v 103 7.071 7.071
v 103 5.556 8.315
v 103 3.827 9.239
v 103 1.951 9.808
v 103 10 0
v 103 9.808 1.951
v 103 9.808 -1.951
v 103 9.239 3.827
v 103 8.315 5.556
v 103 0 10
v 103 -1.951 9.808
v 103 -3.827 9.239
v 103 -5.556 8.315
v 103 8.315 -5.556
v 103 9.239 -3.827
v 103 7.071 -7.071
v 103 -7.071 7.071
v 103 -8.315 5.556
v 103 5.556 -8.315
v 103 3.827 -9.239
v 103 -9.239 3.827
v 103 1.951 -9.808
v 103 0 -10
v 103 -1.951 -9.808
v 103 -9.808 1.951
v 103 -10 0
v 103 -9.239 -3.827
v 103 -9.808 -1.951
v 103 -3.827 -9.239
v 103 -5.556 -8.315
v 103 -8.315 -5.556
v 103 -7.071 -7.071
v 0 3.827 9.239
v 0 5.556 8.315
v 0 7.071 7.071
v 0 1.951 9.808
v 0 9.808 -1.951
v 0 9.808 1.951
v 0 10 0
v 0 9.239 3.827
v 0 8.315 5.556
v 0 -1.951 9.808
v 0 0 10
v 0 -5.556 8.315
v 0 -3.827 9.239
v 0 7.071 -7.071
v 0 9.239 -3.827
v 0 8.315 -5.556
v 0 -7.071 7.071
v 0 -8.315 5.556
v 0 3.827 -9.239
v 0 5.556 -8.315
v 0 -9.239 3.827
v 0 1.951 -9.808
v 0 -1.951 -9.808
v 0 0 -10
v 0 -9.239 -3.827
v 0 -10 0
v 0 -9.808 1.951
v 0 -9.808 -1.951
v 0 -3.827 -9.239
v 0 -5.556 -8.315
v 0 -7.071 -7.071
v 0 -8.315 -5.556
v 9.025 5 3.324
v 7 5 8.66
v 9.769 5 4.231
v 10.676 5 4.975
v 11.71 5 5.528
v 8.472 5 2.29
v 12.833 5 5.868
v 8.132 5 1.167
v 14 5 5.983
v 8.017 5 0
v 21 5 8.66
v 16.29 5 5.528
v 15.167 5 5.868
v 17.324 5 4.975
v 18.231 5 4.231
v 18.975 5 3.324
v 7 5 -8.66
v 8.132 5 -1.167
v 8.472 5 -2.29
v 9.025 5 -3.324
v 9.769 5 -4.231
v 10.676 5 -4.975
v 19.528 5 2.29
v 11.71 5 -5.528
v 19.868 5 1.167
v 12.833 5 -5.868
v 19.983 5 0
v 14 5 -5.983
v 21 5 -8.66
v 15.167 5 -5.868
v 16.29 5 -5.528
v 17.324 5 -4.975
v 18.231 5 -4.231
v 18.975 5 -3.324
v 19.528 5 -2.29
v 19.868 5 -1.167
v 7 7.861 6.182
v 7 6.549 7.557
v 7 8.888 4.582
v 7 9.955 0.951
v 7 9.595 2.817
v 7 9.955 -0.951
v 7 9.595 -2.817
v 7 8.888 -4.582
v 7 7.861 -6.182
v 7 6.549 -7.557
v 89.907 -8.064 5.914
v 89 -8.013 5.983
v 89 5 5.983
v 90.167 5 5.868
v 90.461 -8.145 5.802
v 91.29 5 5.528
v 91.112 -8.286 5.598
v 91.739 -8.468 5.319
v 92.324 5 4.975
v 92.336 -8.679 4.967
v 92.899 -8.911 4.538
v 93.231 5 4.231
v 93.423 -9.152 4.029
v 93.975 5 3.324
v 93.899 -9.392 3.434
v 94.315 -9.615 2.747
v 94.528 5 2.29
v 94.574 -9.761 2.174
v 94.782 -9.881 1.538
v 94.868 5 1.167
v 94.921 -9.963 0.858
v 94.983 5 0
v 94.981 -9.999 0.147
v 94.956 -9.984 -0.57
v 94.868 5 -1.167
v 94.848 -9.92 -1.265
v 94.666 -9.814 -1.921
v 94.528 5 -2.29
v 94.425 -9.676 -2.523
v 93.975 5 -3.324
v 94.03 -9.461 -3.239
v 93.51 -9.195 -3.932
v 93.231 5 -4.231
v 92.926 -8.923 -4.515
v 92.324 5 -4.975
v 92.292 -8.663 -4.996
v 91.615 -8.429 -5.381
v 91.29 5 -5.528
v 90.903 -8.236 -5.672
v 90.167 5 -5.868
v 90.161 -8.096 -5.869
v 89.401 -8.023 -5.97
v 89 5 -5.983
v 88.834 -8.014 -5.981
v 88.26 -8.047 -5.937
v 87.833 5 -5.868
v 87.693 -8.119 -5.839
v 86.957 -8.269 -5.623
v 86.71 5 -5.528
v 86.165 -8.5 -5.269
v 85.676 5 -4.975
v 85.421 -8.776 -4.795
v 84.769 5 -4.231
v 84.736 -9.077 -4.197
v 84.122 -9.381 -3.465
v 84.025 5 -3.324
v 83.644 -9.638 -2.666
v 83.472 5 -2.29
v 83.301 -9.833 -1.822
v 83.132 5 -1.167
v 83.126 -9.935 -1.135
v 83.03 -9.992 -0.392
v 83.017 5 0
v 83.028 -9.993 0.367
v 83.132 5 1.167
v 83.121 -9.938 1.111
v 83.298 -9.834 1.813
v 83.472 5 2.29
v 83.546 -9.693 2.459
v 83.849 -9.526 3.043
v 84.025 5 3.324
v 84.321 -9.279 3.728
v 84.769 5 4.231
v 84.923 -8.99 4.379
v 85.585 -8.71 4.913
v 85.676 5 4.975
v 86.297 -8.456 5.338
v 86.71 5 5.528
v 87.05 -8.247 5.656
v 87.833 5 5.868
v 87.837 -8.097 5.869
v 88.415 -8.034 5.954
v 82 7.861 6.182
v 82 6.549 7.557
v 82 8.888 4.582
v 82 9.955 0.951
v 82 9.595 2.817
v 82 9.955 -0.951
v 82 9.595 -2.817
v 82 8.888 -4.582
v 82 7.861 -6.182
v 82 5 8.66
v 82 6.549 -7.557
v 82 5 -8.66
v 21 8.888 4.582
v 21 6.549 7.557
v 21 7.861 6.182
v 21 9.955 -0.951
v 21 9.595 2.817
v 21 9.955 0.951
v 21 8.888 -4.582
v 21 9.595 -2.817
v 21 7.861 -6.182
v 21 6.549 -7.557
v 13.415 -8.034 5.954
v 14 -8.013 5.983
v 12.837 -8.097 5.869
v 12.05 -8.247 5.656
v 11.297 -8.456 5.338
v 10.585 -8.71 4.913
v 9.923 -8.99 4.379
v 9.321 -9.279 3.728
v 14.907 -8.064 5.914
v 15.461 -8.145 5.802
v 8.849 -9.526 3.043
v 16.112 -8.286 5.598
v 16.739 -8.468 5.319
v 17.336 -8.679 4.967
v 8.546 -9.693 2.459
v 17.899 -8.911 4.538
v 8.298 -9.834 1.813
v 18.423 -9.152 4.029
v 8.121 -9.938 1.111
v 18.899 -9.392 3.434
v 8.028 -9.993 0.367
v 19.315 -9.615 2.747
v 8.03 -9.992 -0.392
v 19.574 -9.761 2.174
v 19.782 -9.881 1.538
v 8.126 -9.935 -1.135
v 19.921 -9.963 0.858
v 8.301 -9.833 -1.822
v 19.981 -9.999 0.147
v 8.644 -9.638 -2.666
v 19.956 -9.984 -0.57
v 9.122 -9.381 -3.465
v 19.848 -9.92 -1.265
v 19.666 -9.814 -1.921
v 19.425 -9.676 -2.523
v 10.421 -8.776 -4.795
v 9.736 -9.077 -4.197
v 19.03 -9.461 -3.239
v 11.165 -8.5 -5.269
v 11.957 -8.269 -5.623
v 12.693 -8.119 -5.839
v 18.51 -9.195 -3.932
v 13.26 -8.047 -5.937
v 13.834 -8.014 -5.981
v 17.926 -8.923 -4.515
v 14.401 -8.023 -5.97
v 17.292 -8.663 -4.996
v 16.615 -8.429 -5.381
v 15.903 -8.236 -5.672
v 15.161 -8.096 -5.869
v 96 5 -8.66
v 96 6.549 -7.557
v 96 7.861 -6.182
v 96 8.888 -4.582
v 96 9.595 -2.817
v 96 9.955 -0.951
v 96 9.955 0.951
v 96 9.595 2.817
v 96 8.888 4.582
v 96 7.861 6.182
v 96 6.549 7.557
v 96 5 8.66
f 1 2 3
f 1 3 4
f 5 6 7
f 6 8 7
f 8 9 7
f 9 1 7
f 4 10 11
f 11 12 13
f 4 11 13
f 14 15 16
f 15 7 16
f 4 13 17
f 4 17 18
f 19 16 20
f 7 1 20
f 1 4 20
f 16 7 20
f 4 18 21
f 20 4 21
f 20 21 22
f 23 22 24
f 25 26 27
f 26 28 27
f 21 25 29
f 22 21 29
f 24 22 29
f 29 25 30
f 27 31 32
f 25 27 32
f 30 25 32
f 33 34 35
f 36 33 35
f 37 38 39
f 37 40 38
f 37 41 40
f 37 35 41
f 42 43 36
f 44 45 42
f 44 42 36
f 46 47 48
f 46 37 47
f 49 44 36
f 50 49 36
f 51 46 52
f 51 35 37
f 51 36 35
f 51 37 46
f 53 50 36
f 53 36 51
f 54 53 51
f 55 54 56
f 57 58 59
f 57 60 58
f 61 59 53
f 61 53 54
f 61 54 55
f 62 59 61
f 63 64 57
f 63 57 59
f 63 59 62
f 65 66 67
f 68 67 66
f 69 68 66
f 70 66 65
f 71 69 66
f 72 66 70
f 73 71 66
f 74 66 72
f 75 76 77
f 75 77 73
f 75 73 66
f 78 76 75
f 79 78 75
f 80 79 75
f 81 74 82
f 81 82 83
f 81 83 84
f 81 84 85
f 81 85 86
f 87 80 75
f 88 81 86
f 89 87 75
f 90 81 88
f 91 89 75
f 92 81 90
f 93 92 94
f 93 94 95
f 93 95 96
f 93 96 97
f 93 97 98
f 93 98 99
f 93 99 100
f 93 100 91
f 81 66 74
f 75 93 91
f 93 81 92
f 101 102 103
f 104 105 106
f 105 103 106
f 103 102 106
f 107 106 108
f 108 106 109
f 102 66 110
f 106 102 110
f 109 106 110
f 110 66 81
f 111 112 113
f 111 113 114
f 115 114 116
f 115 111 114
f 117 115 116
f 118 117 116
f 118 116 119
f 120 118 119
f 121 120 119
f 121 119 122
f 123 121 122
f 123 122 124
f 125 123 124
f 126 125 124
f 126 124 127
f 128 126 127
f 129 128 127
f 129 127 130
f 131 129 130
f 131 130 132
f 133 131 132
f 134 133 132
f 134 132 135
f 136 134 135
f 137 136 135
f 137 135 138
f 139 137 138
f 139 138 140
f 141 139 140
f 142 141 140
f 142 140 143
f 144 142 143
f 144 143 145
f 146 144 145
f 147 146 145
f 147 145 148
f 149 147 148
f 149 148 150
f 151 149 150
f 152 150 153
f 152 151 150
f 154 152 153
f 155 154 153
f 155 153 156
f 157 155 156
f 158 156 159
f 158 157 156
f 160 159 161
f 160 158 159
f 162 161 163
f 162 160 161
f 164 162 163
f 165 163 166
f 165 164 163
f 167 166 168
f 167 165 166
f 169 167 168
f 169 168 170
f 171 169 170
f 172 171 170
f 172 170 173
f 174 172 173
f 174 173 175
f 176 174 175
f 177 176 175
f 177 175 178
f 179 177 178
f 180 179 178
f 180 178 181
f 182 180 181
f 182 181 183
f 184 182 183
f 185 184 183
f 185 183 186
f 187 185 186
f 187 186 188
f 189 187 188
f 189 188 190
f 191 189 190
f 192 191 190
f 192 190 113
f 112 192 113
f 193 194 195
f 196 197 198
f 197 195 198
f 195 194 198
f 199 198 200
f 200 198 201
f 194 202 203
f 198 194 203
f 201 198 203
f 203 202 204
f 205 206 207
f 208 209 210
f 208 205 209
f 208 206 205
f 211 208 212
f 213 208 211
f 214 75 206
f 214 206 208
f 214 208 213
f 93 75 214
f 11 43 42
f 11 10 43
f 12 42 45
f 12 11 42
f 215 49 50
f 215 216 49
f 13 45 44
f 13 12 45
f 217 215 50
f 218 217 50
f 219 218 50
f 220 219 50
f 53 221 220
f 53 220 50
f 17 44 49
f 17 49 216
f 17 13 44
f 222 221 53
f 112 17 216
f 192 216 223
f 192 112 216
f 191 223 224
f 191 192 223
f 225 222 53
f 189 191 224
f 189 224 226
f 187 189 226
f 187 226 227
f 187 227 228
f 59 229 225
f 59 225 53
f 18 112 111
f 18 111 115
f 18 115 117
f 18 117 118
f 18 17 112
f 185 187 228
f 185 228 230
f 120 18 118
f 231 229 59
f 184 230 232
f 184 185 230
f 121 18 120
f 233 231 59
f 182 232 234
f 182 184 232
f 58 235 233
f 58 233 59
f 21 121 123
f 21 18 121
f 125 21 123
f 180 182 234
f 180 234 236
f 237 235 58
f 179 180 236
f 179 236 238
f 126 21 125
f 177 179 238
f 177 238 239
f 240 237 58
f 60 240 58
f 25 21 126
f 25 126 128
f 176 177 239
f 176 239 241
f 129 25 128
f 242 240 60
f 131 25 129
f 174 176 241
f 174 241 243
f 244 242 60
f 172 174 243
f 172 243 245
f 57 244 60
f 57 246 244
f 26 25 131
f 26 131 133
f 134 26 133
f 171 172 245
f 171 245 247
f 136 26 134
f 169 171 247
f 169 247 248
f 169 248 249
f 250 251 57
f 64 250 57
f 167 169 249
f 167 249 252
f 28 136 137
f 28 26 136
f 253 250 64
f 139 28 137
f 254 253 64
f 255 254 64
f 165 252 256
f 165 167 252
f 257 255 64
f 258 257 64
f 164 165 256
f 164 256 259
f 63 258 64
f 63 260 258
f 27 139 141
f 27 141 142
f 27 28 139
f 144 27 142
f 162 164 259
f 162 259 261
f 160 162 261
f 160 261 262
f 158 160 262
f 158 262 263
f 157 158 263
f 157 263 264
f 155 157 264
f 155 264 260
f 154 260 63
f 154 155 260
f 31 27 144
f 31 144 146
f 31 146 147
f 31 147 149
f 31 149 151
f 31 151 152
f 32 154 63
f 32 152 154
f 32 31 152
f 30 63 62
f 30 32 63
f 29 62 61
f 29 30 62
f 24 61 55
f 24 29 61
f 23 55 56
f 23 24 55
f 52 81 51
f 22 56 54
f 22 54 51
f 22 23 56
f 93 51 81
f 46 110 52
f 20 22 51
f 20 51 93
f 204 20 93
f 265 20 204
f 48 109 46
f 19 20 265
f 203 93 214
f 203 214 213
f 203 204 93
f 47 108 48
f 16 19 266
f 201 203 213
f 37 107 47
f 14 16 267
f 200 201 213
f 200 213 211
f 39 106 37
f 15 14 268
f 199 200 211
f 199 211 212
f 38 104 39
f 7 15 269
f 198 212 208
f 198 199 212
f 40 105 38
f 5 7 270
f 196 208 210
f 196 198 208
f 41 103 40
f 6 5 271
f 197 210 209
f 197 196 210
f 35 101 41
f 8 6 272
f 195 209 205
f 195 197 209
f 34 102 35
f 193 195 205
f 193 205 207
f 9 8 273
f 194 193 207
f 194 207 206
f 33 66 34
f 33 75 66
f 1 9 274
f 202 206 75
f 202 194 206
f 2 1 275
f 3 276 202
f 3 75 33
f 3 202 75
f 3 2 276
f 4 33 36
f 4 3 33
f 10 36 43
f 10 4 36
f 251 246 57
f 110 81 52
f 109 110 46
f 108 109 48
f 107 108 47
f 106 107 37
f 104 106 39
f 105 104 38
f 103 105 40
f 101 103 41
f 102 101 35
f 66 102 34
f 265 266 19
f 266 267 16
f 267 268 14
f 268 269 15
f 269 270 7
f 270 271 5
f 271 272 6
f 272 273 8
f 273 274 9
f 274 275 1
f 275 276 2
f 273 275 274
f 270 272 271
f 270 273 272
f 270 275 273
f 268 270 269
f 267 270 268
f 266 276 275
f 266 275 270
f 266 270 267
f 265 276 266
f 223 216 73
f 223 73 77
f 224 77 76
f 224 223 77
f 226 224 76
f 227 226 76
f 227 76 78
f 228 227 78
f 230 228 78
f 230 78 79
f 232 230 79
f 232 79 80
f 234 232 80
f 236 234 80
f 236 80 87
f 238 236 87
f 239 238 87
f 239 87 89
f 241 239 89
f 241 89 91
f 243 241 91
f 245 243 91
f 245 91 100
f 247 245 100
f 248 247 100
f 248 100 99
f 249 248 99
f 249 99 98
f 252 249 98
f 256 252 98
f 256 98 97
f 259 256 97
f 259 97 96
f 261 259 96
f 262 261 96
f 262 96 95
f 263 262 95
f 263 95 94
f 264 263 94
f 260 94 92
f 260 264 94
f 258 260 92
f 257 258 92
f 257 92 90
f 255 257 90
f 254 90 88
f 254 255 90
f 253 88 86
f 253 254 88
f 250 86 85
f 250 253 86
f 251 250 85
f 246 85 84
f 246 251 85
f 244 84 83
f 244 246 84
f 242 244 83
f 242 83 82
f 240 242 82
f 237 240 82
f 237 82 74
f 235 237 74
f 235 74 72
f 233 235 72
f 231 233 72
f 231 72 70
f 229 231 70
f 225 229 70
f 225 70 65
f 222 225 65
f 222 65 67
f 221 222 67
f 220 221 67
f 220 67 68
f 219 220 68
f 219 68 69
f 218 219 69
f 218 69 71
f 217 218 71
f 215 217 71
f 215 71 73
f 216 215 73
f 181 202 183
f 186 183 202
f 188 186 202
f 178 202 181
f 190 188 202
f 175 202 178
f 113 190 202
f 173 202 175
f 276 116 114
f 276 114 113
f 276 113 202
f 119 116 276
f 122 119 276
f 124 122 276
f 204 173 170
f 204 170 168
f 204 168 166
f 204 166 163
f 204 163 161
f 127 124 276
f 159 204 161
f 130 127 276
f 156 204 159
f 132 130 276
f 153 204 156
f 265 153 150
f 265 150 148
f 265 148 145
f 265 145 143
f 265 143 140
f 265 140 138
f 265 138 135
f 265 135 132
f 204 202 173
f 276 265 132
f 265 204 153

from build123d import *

# Parameters (mm, degrees)
ESQUISSE1_W                  = 103
ESQUISSE1_H                  = 10
ENL_V_MAT_EXTRU_4_DEPTH      = 104.966340707
ENL_V_MAT_EXTRU_4_DEPTH_BACK = 104.966340707
ESQUISSE8_R                  = 5.983
ENL_V_START                  = 5
ESQUISSE9_W                  = 14
ESQUISSE9_H                  = 20
ENL_V_MAT_EXTRU_6_DEPTH      = 99.966340826


with BuildPart() as part:
    # Esquisse1 → Révolution1 (revolve)
    with BuildSketch(Plane.XY, mode=Mode.PRIVATE) as r_volution1_sk:
        with Locations((51.5, 5)):
            Rectangle(ESQUISSE1_W, ESQUISSE1_H)
    revolve(r_volution1_sk.sketch.rotate(Axis((0, 0, 0), (1, 0, 0)), 90), axis=Axis((0, 0, 0), (1, 0, 0)))

    # Esquisse8 → Enlèv. mat.-Extru.4 (cut, two sides: drawn at the far end of the back side and taken through both)
    with BuildSketch(Plane(origin=(0, 0, 0), x_dir=(1, 0, 0), z_dir=(0, 1, 0)).offset(-ENL_V_MAT_EXTRU_4_DEPTH_BACK)):
        with Locations(Location((14, 0, 0), (0, 0, 270))):
            Circle(ESQUISSE8_R)
        with Locations(Location((89, 0, 0), (0, 0, 270))):
            Circle(ESQUISSE8_R)
    extrude(amount=ENL_V_MAT_EXTRU_4_DEPTH + ENL_V_MAT_EXTRU_4_DEPTH_BACK, mode=Mode.SUBTRACT)

    # Esquisse9 → Enlèv. mat.-Extru.6 (cut, through all)
    with BuildSketch(Plane(origin=(0, 0, 0), x_dir=(1, 0, 0), z_dir=(0, 1, 0)).offset(ENL_V_START)):
        with Locations((14, 0)):
            Rectangle(ESQUISSE9_W, ESQUISSE9_H)
        with Locations((89, 0)):
            Rectangle(ESQUISSE9_W, ESQUISSE9_H)
    extrude(amount=ENL_V_MAT_EXTRU_6_DEPTH, mode=Mode.SUBTRACT)


solid = part.part
